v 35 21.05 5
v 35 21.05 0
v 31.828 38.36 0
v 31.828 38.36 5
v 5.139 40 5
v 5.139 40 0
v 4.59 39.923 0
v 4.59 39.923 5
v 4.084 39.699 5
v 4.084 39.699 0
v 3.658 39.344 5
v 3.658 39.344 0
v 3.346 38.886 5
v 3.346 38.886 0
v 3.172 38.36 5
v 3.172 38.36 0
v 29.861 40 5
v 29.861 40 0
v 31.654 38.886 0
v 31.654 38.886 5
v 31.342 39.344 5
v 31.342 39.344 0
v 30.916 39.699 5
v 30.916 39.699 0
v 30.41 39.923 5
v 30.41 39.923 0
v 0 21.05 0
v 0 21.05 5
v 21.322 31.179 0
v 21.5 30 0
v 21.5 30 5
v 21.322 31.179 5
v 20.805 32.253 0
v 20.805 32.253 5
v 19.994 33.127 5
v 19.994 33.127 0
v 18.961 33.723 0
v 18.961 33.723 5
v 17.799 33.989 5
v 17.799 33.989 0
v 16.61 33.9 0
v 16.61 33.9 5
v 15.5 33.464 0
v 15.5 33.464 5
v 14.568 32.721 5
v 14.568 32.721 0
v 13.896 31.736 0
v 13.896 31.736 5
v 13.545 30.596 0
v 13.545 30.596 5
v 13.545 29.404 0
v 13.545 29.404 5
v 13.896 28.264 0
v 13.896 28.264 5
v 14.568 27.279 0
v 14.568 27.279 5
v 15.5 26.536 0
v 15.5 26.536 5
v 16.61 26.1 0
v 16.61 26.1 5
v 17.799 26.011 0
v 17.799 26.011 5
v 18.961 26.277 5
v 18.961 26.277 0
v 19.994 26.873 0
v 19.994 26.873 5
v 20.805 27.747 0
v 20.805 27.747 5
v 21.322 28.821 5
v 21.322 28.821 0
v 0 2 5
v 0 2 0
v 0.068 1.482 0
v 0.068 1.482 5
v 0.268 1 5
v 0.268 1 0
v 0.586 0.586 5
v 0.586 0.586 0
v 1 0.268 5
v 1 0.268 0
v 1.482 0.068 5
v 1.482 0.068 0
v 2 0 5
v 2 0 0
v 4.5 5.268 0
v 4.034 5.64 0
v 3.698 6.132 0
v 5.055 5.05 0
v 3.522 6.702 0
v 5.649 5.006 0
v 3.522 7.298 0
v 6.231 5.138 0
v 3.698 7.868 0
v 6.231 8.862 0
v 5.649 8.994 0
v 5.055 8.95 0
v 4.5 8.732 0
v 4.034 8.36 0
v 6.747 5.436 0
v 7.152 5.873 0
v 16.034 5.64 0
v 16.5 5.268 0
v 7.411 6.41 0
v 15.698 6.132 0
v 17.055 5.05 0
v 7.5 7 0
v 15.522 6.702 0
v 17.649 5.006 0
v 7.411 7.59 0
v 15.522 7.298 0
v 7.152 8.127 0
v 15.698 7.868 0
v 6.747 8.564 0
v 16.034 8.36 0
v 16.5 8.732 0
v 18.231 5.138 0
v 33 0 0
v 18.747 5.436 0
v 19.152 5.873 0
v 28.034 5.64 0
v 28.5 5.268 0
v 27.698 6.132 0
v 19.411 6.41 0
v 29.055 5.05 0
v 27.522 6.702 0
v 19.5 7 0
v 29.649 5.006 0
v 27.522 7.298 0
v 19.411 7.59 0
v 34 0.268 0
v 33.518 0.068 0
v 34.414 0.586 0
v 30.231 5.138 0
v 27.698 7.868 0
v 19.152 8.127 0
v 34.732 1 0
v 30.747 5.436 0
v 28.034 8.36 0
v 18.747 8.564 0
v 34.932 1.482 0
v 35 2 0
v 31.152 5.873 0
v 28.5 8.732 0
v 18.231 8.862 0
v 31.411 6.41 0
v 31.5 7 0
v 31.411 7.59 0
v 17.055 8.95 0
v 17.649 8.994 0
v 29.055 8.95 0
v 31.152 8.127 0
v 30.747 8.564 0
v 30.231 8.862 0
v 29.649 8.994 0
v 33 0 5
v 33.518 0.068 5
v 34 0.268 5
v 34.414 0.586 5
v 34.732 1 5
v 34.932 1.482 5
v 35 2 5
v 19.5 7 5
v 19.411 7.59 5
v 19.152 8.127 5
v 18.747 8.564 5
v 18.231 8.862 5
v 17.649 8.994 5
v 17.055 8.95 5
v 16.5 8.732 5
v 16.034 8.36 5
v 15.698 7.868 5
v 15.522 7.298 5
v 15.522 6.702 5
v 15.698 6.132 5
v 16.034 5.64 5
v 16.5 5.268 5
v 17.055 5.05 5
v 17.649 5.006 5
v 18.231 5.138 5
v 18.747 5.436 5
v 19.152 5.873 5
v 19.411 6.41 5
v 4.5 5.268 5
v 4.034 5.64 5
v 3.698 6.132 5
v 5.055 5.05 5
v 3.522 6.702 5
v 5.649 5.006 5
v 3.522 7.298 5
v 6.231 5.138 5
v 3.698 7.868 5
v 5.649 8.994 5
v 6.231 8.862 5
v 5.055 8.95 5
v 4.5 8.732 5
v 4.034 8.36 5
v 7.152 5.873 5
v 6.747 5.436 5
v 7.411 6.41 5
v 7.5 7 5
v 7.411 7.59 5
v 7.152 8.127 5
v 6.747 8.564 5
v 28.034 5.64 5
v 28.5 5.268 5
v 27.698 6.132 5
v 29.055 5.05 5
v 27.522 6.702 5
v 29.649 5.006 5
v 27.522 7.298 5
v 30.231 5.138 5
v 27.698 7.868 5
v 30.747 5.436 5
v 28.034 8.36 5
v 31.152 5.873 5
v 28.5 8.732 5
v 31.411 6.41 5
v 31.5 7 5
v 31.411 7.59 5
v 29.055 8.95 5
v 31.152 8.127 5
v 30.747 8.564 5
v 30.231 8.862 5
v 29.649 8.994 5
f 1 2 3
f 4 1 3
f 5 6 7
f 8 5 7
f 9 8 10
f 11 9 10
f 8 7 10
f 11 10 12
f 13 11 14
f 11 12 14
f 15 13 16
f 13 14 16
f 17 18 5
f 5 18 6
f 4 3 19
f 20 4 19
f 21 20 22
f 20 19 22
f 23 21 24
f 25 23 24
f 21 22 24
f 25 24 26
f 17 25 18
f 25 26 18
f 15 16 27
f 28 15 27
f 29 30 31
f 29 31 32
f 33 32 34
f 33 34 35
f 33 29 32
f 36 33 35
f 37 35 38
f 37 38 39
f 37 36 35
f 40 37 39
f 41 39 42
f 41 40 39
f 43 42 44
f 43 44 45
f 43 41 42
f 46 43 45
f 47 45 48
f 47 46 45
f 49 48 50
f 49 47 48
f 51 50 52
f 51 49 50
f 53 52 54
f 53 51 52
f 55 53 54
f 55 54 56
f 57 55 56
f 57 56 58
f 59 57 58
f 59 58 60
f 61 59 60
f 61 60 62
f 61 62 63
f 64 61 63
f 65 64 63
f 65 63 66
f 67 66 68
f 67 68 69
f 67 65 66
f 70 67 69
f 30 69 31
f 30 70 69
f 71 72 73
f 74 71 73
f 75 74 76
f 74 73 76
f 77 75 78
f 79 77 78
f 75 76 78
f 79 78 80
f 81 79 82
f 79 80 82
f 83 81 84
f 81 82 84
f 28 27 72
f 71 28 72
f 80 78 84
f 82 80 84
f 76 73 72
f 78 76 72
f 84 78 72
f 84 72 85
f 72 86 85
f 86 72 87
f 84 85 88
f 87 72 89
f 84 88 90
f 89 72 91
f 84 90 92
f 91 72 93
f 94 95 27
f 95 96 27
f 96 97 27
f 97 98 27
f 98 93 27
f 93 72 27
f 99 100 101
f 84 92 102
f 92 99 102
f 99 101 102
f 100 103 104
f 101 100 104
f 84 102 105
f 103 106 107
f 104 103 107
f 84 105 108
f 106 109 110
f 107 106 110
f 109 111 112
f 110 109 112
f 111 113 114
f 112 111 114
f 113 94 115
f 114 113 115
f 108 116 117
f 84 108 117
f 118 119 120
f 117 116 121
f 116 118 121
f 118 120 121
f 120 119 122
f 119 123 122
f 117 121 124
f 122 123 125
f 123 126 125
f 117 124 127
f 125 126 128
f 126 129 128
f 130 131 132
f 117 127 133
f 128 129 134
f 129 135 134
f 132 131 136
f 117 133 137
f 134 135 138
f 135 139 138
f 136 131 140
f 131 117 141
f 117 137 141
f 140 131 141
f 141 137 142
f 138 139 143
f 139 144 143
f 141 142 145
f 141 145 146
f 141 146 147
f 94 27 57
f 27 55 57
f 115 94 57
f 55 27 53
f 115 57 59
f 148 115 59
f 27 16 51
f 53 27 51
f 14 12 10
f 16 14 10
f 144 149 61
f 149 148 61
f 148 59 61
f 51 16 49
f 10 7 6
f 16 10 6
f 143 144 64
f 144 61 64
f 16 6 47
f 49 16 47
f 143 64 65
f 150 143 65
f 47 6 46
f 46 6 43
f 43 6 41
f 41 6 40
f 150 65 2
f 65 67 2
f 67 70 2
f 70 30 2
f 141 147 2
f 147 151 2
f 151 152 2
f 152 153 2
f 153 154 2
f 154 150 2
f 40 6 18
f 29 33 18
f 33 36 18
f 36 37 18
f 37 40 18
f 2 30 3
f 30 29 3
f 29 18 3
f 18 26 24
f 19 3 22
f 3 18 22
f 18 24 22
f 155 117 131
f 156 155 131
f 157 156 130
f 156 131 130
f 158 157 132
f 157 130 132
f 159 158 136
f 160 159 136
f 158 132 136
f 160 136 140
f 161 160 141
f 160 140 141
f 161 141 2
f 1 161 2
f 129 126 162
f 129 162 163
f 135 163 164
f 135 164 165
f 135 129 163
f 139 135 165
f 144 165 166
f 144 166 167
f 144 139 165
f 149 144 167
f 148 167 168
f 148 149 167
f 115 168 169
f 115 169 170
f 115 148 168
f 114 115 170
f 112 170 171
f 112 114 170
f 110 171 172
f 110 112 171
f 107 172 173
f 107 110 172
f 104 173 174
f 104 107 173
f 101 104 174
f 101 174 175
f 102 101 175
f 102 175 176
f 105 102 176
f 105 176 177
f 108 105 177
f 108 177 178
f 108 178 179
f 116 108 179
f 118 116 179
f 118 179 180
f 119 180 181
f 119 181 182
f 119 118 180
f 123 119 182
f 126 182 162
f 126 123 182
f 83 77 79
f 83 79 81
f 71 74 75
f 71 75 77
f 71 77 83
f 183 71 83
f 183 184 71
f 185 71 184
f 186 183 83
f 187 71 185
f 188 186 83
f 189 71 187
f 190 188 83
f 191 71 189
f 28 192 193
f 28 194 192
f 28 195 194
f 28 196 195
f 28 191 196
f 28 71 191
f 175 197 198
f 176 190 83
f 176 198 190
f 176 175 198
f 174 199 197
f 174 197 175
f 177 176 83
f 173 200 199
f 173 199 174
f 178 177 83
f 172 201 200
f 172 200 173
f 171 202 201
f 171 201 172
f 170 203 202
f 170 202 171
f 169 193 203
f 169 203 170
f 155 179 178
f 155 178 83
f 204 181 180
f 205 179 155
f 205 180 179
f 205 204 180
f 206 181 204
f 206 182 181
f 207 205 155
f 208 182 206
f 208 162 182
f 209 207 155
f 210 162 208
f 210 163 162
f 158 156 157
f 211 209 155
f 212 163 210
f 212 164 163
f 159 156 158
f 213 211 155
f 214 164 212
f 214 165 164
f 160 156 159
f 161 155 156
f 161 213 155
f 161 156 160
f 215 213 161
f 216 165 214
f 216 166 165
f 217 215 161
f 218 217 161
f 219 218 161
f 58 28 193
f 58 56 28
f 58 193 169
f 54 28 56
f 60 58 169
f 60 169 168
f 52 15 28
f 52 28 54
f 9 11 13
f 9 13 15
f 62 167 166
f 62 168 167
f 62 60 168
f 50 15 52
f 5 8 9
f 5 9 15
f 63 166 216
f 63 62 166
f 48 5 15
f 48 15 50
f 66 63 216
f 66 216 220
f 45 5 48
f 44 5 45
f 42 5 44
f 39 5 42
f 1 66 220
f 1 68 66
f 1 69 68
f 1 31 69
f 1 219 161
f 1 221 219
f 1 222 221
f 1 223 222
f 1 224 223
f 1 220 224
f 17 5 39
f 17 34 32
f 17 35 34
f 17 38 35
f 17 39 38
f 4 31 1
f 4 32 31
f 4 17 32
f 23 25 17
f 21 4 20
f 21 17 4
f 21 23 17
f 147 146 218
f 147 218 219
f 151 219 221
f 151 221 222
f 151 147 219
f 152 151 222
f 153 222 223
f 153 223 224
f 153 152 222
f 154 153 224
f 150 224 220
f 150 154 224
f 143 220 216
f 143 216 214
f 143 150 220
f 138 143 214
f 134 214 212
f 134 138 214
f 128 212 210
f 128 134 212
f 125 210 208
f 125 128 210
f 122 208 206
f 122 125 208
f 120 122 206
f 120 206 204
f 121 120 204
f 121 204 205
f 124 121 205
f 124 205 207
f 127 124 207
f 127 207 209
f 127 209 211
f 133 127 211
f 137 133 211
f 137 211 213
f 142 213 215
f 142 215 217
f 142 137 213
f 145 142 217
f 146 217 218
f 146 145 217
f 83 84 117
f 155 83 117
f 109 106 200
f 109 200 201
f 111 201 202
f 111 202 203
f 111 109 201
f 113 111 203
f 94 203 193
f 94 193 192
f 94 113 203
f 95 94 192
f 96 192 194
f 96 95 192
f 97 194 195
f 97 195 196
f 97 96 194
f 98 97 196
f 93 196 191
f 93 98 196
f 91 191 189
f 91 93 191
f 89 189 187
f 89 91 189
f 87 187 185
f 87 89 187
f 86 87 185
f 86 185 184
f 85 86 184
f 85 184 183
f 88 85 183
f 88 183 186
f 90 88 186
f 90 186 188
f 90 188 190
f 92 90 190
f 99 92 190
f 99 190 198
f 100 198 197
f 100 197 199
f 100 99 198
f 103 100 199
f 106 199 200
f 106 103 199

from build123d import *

# Parameters (mm, degrees)
SKETCH_1_R      = 4
SKETCH_1_R_2    = 2
EXTRUDE_1_DEPTH = 5


with BuildPart() as part:
    # 草图1 → 凸台-拉伸1 (new body)
    with BuildSketch(Plane.XY):
        with BuildLine():
            Line((2, 0), (33, 0))
            ThreePointArc((33, 0), (34.414213562, 0.585786438), (35, 2))
            Line((35, 2), (35, 21.050341825))
            Line((35, 21.050341825), (31.828098105, 38.360477291))
            ThreePointArc((31.828098105, 38.360477291), (31.141290767, 39.536384487), (29.860852284, 40))
            Line((29.860852284, 40), (5.139147716, 40))
            ThreePointArc((5.139147716, 40), (3.858709233, 39.536384487), (3.171901895, 38.360477291))
            Line((3.171901895, 38.360477291), (0, 21.050341825))
            Line((0, 21.050341825), (0, 2))
            ThreePointArc((0, 2), (0.585786438, 0.585786438), (2, 0))
        make_face()
        with Locations((17.5, 30)):
            Circle(SKETCH_1_R, mode=Mode.SUBTRACT)
        with Locations((17.5, 7)):
            Circle(SKETCH_1_R_2, mode=Mode.SUBTRACT)
        with Locations((29.5, 7)):
            Circle(SKETCH_1_R_2, mode=Mode.SUBTRACT)
        with Locations((5.5, 7)):
            Circle(SKETCH_1_R_2, mode=Mode.SUBTRACT)
    extrude(amount=EXTRUDE_1_DEPTH)


solid = part.part
